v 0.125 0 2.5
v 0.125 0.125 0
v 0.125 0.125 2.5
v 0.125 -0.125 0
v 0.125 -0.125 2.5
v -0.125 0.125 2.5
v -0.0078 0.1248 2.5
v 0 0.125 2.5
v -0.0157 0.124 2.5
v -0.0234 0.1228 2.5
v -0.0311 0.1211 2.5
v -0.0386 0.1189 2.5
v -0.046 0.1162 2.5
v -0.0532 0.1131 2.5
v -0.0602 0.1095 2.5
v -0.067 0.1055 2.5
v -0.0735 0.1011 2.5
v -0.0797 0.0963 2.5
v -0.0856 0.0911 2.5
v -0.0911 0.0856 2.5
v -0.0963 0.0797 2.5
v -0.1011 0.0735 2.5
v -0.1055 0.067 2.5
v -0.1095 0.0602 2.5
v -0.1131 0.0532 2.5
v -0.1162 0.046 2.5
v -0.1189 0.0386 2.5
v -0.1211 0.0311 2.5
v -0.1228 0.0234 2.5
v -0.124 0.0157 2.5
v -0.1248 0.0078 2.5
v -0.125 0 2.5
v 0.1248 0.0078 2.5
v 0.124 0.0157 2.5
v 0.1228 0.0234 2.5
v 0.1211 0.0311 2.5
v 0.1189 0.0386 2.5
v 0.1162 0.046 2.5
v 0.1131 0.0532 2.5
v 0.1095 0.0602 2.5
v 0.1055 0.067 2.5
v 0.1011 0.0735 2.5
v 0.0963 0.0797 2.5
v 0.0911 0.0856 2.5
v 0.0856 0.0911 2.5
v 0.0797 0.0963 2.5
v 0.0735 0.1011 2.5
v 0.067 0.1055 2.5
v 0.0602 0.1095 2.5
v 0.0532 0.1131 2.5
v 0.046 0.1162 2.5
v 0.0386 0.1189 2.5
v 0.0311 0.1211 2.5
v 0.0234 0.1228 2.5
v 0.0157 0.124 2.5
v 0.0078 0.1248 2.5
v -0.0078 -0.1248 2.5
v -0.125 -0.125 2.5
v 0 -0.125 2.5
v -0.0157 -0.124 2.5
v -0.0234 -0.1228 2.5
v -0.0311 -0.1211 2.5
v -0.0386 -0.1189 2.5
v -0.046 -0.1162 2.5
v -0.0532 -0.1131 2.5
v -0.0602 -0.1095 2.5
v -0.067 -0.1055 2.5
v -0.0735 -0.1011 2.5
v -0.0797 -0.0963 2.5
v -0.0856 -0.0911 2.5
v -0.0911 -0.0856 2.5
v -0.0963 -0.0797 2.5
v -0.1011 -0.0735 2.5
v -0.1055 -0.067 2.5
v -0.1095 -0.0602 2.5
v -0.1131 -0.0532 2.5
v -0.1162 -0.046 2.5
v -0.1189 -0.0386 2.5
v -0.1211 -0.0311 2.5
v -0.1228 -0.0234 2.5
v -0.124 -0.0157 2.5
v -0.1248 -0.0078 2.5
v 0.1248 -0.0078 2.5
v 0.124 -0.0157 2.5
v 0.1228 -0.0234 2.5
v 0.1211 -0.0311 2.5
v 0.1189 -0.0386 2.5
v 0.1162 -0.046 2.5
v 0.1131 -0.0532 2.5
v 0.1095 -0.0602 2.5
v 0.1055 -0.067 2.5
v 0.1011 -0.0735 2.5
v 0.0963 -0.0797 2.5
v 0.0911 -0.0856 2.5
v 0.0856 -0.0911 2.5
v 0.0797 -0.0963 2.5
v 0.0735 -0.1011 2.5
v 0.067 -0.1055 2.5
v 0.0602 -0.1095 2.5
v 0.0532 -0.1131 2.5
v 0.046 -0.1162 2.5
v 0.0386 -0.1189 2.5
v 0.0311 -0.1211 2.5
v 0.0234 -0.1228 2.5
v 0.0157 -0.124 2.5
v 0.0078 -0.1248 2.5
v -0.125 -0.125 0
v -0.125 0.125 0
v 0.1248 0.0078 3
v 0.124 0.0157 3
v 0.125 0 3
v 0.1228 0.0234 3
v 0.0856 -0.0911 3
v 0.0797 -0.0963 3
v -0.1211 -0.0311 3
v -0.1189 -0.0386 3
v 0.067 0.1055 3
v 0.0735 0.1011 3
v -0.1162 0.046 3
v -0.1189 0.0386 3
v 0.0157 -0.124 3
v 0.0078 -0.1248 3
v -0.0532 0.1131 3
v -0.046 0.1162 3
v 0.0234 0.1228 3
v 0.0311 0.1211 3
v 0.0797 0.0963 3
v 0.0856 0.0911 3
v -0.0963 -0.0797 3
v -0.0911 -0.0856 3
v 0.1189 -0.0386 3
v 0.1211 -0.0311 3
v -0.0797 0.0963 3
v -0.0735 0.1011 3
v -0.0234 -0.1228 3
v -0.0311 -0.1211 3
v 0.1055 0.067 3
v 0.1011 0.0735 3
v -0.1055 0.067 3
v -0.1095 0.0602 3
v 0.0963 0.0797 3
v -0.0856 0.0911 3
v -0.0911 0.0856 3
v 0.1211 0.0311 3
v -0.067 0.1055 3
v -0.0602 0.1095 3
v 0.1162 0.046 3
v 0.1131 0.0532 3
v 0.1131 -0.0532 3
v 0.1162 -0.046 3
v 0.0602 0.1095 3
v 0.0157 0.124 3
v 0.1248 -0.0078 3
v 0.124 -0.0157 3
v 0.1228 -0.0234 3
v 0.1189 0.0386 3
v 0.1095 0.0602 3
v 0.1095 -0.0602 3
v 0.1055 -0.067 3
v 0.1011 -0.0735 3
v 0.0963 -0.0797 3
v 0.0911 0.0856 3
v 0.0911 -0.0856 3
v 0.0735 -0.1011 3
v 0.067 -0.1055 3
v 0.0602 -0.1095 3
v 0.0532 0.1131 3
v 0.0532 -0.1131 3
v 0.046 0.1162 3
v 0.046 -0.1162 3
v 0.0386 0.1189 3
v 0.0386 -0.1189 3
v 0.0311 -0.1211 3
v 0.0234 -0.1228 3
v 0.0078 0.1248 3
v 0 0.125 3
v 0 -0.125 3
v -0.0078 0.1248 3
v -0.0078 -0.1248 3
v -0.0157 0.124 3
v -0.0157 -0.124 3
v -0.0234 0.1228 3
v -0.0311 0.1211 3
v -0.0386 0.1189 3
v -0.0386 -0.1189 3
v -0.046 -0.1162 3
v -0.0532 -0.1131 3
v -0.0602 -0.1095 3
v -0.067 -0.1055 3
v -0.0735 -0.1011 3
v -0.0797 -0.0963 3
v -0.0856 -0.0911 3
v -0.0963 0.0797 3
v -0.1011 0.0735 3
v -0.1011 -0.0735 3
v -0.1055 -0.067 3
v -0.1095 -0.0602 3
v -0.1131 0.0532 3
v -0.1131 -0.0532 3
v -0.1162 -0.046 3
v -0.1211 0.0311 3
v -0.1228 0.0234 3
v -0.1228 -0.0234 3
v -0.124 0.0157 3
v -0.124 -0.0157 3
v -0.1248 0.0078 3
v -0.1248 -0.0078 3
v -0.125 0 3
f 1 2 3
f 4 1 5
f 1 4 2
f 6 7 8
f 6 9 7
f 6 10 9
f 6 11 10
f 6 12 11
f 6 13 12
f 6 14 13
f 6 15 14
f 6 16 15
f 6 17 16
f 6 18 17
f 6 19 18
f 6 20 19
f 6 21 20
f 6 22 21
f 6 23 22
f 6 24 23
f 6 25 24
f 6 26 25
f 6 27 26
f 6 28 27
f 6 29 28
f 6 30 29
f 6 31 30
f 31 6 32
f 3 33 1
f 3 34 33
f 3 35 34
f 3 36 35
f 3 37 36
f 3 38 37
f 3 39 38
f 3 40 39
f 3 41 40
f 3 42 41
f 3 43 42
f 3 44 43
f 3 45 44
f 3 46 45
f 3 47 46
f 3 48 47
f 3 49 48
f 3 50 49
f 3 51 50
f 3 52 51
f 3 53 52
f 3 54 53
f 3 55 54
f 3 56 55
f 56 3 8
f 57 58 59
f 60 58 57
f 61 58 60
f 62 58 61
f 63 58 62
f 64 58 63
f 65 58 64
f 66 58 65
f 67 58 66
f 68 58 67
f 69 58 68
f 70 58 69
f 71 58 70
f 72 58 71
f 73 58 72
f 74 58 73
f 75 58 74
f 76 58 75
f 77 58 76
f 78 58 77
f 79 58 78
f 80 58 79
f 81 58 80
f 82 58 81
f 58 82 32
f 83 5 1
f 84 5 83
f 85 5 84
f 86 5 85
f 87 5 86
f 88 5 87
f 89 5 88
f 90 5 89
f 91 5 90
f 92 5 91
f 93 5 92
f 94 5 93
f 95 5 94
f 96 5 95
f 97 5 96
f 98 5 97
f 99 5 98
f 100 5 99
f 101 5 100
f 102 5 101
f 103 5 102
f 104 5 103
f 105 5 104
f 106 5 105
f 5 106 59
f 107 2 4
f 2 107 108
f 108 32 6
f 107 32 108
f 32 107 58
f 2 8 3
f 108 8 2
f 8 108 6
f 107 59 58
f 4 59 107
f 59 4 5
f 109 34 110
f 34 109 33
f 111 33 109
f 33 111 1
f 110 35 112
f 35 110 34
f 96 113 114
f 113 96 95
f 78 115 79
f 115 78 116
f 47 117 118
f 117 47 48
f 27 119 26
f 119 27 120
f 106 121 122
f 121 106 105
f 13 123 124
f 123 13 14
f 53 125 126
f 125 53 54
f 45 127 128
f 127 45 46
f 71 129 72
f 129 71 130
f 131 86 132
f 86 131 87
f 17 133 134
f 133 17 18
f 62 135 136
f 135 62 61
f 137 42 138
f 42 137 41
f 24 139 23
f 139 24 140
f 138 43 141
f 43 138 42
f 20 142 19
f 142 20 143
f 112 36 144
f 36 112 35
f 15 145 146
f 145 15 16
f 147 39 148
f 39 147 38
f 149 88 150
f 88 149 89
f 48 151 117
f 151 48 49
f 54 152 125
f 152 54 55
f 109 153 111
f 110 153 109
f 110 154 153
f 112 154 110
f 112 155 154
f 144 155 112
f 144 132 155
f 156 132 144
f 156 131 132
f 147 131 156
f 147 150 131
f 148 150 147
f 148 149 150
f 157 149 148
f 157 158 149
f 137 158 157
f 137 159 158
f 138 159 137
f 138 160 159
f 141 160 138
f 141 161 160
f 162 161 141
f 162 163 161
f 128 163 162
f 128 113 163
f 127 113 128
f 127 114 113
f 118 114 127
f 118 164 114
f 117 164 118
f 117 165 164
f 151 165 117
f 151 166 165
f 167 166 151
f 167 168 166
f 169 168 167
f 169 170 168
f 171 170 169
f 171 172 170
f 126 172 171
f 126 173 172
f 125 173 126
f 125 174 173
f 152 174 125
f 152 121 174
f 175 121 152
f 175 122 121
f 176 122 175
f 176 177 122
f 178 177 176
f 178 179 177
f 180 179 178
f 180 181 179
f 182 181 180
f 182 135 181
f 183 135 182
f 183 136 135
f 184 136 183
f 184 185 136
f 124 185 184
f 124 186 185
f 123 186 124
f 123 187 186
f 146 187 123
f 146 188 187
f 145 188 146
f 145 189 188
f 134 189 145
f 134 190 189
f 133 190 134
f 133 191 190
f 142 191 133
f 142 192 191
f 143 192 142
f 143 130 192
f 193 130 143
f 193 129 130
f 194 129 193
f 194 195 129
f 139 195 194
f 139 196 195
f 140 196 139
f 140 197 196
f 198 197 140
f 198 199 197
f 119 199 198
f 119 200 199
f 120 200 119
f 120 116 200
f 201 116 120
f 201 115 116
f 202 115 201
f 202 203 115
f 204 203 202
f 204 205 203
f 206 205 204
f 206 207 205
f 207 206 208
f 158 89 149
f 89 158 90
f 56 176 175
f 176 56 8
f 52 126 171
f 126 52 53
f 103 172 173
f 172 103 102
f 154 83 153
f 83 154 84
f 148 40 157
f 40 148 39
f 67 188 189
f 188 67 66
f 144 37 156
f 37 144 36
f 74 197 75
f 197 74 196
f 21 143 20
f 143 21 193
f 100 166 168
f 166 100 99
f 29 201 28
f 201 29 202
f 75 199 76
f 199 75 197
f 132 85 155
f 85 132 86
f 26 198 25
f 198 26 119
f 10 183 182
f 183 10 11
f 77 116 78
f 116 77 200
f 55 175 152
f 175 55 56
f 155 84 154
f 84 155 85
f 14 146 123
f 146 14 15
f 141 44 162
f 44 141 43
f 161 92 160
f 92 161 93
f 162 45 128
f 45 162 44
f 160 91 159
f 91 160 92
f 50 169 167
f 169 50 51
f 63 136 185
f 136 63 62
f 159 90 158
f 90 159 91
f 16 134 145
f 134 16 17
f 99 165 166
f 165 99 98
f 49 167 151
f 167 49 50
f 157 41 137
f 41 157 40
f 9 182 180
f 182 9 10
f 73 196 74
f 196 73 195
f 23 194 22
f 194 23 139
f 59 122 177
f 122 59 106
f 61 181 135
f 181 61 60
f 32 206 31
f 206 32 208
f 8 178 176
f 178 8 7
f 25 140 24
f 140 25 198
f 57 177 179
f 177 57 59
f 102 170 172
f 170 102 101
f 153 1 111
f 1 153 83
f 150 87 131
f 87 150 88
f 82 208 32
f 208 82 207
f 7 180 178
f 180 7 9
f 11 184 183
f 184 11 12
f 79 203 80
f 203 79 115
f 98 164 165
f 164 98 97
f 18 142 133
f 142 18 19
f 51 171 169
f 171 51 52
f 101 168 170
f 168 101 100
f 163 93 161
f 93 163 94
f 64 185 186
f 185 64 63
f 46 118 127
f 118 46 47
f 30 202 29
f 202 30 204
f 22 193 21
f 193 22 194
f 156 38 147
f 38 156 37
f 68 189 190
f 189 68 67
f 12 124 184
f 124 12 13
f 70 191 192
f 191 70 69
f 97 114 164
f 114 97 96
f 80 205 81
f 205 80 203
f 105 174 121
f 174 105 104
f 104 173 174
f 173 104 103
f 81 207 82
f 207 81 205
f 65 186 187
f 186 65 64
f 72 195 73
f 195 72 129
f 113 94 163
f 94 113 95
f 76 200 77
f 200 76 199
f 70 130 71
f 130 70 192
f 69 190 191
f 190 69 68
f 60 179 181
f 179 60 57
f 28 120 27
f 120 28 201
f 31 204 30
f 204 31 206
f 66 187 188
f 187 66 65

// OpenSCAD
//##################################################################
// rounded post.scad - square post with rounded top
// (c) 2021 - Roie R. Black
// docs: https://rblack.github.io/math-magik/magik/rounded_post.html

$fn=100;

module rounded_post(z1=3, z2=2.5, t = 0.25, center=true) {
  off = (center)? t/2: 0;
  coff = (center)?0: t/2;
  union() {
    translate([-off,-off,0])
      cube([t,t,z2]);
    translate([coff,coff,z2])
      cylinder(r=t/2, h=z1-z2);
  }
}

rounded_post();
